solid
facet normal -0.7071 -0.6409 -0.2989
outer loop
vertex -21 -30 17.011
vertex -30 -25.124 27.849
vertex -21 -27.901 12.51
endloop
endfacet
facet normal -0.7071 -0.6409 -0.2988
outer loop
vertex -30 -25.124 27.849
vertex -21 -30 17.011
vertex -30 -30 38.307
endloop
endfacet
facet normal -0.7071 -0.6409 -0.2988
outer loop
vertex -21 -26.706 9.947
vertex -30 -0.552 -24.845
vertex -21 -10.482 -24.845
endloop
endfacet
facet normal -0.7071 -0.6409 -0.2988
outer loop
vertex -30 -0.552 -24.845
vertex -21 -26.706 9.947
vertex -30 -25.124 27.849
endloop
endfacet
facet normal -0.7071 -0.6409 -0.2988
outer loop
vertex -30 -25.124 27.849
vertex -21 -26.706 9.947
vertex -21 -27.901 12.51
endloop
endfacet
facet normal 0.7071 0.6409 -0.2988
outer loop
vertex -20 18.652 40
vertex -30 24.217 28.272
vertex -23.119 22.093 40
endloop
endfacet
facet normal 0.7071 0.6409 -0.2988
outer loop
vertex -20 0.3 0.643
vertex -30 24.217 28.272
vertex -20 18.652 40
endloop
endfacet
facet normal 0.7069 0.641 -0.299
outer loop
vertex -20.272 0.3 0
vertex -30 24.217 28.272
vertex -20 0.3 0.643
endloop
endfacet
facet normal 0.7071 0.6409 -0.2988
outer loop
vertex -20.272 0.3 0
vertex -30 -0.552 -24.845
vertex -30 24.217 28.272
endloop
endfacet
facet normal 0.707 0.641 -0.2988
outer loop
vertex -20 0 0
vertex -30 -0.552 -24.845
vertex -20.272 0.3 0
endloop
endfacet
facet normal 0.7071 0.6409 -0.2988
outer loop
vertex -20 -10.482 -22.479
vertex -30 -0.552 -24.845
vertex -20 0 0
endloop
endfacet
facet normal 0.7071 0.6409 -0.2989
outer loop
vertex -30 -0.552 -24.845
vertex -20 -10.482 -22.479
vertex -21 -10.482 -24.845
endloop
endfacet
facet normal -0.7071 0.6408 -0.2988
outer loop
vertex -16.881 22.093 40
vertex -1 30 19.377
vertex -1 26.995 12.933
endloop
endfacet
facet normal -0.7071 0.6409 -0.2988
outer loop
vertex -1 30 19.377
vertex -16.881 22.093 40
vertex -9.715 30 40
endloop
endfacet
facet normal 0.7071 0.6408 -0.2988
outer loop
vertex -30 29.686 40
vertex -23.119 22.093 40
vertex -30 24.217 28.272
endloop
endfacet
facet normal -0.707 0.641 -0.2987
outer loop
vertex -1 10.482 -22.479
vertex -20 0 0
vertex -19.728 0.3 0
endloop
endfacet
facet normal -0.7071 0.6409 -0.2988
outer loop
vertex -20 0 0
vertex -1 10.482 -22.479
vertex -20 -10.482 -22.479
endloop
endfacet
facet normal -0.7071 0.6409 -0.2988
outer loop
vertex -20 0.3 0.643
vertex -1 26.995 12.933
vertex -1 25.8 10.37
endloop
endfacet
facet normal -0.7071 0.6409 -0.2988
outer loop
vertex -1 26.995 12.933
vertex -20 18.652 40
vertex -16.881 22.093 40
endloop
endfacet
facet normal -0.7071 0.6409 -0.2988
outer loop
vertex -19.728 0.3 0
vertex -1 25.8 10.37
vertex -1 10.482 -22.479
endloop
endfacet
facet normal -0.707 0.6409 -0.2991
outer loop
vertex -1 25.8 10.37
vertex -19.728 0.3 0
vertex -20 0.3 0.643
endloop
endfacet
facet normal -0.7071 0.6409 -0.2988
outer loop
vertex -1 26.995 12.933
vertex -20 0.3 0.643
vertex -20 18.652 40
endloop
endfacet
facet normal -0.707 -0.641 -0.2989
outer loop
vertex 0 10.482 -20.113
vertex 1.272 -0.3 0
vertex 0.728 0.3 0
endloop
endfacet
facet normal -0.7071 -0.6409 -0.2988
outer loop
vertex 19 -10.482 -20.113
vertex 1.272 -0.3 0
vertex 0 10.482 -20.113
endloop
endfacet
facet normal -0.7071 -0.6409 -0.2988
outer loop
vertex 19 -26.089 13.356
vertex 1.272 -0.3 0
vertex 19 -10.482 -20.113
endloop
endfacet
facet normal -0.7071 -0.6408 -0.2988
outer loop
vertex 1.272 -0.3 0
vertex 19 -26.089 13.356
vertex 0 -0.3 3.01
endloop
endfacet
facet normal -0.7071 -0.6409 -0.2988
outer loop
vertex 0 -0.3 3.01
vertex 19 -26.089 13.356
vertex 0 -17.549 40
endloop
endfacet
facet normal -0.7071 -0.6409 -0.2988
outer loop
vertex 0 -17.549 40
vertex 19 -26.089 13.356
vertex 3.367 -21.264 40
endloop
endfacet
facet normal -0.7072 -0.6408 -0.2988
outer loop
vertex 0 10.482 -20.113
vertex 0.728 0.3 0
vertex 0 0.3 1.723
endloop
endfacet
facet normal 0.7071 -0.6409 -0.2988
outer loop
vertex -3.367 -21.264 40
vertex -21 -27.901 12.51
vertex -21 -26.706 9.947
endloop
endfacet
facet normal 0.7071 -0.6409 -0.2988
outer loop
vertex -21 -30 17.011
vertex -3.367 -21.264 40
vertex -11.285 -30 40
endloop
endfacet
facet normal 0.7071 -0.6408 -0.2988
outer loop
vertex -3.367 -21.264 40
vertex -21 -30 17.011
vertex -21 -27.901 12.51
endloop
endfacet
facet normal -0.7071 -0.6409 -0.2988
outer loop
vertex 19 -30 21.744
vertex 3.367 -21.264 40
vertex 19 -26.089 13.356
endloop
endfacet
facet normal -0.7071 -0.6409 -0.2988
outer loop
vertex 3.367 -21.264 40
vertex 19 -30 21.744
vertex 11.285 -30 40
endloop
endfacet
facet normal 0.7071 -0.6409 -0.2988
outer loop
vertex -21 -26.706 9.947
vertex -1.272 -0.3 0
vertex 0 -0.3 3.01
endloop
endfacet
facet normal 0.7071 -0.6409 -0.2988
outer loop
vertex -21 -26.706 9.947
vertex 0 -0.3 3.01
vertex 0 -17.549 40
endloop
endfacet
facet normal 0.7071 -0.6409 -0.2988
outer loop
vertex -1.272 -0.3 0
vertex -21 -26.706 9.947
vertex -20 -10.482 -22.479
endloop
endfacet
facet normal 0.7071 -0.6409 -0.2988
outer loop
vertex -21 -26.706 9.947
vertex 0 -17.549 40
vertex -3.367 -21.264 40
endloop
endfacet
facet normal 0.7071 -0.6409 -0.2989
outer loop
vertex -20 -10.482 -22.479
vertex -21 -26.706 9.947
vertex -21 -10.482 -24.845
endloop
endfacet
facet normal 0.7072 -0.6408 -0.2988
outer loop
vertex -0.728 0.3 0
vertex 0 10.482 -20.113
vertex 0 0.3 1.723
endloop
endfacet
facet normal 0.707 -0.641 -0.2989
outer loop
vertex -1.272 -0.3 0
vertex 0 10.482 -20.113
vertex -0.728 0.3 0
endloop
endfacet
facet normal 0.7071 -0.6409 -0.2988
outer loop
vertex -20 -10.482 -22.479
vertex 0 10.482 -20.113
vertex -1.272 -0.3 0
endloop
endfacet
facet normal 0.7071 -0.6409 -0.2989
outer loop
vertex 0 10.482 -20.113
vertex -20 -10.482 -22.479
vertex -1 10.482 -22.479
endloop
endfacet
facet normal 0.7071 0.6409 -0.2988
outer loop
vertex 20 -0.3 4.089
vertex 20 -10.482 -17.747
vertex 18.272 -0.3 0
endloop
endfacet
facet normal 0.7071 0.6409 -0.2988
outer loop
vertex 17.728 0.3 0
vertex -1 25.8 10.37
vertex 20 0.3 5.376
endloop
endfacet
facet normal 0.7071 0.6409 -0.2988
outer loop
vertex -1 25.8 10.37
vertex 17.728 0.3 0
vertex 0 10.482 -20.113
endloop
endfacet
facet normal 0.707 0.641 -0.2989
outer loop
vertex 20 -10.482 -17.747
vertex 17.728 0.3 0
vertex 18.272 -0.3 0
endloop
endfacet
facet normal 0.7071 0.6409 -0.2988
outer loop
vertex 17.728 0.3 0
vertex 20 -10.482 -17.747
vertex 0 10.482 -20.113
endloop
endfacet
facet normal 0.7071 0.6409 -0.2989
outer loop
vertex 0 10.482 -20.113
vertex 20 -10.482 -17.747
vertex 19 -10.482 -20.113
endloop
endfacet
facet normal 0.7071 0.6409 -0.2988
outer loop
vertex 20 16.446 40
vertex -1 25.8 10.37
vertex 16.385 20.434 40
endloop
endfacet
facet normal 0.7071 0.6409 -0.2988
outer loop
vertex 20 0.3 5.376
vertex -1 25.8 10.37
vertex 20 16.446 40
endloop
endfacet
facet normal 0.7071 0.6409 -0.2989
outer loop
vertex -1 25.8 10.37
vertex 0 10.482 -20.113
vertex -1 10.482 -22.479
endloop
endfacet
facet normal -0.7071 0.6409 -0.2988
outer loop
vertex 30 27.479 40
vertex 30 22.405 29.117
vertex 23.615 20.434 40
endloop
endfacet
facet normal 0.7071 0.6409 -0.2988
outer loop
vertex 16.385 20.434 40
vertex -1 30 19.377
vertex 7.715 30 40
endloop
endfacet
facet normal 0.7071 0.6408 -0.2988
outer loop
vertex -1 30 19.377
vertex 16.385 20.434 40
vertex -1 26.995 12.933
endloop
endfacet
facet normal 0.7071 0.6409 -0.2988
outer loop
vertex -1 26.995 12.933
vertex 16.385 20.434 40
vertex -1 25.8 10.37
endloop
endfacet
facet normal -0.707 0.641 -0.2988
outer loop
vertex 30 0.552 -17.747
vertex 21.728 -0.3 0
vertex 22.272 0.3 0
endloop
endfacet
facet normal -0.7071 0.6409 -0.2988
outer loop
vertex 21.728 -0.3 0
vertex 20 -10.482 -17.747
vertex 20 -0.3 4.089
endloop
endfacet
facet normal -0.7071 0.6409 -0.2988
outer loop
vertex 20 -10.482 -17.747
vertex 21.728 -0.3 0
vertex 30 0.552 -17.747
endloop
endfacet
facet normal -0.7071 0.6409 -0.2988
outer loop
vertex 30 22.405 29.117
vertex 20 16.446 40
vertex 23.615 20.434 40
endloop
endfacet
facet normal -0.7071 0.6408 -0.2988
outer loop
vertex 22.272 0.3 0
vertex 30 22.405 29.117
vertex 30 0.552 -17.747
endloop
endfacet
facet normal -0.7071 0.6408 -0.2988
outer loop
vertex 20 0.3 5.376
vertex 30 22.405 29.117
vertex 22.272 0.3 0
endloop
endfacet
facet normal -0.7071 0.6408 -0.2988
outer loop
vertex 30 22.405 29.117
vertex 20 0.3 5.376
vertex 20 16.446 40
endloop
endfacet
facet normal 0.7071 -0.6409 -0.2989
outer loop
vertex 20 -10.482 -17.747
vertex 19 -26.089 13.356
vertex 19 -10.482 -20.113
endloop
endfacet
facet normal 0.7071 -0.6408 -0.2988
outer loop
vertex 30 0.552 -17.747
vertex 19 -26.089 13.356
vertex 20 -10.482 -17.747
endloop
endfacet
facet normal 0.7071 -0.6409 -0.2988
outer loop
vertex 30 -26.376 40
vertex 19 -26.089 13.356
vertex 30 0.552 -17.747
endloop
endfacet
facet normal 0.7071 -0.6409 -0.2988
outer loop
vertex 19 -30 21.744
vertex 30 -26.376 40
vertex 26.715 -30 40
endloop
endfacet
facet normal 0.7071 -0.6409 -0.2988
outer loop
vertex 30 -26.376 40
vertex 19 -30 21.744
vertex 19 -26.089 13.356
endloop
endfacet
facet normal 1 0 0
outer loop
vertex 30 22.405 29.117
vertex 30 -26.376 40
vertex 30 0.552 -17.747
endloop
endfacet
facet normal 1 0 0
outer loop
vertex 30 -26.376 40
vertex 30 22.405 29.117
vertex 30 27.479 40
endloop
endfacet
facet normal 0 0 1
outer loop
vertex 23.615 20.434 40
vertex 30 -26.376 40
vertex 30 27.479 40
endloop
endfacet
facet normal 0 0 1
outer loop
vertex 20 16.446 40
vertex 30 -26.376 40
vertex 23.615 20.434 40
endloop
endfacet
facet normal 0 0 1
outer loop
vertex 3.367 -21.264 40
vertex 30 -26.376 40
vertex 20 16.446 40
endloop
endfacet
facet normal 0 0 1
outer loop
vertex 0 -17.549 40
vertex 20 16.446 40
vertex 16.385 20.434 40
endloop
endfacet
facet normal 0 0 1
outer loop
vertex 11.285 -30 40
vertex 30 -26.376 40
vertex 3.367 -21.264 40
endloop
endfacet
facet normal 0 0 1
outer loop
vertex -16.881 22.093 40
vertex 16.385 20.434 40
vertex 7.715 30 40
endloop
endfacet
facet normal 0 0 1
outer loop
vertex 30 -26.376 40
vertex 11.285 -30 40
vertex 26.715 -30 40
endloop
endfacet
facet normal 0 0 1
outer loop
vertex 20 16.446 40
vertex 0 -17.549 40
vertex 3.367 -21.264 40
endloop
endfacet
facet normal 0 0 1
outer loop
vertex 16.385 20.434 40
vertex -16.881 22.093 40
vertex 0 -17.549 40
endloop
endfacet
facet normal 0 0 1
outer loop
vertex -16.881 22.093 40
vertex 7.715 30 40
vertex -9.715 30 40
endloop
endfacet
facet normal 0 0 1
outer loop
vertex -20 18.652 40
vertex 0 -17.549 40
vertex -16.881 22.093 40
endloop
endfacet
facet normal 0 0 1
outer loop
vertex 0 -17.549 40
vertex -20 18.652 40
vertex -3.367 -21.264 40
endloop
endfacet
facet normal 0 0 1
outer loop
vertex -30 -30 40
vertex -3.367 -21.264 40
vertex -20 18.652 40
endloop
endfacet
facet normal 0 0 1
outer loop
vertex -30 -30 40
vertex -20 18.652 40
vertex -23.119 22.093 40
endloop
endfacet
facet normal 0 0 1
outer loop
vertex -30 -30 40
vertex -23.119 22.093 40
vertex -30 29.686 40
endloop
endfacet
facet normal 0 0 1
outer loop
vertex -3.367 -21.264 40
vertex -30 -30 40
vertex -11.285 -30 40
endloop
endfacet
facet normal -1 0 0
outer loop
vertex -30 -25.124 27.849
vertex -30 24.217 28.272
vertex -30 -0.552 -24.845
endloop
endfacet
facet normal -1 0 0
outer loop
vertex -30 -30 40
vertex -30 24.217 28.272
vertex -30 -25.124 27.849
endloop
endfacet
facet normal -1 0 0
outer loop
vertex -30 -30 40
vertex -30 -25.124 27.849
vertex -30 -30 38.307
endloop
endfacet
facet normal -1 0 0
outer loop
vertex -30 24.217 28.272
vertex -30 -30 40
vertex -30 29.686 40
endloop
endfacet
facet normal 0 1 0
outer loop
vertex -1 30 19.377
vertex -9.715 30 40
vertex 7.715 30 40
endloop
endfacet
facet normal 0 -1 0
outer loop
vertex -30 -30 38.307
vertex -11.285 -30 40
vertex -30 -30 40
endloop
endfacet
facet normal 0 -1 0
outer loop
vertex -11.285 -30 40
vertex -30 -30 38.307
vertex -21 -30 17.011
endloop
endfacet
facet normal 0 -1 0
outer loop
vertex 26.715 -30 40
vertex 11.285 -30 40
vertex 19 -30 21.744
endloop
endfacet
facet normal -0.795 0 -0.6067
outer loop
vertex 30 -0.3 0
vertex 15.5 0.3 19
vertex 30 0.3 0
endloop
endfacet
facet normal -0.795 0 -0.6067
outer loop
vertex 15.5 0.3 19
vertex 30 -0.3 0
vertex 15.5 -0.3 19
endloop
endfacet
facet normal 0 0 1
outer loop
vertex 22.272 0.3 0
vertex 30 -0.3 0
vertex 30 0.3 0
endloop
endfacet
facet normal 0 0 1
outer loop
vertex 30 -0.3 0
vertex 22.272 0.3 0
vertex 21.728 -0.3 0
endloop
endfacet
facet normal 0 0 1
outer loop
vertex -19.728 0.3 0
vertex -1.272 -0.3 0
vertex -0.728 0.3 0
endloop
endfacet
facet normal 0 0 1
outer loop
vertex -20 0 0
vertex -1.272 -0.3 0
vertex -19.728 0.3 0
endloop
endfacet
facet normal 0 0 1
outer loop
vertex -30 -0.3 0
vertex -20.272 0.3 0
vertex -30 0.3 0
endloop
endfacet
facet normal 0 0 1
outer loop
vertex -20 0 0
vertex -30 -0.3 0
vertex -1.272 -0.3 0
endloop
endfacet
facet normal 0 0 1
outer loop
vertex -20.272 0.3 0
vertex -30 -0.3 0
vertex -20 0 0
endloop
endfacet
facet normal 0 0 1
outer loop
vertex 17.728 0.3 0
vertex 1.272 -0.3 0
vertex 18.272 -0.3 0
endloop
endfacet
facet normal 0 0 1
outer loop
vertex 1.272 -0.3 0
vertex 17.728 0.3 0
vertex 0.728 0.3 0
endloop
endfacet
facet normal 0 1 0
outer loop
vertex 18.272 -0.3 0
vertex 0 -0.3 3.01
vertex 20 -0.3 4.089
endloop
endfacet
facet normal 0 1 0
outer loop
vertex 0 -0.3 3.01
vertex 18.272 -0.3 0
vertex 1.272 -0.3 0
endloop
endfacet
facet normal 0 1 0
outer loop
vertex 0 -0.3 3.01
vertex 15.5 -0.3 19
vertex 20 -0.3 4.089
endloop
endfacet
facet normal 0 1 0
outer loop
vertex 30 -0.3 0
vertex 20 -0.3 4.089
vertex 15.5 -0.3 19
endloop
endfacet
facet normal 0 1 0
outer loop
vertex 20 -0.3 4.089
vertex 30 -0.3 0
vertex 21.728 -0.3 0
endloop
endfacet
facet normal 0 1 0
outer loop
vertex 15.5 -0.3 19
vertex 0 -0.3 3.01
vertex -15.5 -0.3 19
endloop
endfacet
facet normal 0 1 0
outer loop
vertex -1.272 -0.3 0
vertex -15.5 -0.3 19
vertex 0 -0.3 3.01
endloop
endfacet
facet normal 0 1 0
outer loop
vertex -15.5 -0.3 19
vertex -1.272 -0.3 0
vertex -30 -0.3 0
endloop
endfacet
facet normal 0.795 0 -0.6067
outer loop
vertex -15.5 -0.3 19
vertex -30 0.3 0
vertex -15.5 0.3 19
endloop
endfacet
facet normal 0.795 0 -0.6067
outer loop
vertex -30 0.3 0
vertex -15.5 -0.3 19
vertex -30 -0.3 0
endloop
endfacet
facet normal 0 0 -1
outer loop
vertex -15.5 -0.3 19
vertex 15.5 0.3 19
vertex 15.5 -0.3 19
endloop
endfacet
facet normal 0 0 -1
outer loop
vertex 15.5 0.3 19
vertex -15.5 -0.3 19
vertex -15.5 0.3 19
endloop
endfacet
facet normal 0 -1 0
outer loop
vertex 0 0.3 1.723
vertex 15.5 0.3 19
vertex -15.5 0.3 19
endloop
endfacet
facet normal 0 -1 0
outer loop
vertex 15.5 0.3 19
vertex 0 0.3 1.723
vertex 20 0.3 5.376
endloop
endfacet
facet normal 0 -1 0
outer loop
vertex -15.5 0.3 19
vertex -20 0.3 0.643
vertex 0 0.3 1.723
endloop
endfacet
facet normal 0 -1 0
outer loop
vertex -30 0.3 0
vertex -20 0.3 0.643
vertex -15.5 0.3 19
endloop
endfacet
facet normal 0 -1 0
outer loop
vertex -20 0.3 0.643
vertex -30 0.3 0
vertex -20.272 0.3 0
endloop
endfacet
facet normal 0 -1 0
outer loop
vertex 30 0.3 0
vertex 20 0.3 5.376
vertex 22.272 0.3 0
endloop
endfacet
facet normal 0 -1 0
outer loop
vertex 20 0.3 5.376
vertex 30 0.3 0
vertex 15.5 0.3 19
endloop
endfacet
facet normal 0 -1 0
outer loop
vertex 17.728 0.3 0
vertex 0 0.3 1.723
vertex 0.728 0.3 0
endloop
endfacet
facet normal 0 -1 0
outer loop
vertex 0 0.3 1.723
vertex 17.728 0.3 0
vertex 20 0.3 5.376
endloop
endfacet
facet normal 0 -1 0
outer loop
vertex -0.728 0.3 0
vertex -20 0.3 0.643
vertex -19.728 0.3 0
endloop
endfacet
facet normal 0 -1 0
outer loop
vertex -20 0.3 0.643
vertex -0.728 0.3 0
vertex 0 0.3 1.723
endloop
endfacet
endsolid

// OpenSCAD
width = 60;
length = 30;
height = 80;

bladeWidth1 = 60;
bladeWidth2 = 31;
bladeHeight = 19;
bladeThickness = .6;

module mirror2(xyz) {
  children();
  mirror(xyz) children();
}

module blade() {
  linear_extrude(.6, center = true) {
    polygon([
        [-bladeWidth1 / 2, 0],
        [bladeWidth1 / 2, 0],
        [bladeWidth2 / 2, bladeHeight],
        [-bladeWidth2 / 2, bladeHeight]
      ]);
  }
}

module main(){
  %rotate([90,0,0]) blade();
  big=100;
  ds=[.5,1,2,3];
  difference(){
    cube([width,width,height], center=true);
    //blade gap
    rotate([90,0,0]) blade();
    n=3;
    for(i=[-1:n]) {
      translate([-bladeWidth1 / 2 + bladeWidth1 * (i+.5)/n, 0, 0])
        rotate([-25*(-1)^i, 0, 0])
          translate([0, -i*(-1)^i, 0])
            rotate(45+180*i)
              translate([0, 0, -big / 2])
                cube(big);
    }
  }
}
main();
